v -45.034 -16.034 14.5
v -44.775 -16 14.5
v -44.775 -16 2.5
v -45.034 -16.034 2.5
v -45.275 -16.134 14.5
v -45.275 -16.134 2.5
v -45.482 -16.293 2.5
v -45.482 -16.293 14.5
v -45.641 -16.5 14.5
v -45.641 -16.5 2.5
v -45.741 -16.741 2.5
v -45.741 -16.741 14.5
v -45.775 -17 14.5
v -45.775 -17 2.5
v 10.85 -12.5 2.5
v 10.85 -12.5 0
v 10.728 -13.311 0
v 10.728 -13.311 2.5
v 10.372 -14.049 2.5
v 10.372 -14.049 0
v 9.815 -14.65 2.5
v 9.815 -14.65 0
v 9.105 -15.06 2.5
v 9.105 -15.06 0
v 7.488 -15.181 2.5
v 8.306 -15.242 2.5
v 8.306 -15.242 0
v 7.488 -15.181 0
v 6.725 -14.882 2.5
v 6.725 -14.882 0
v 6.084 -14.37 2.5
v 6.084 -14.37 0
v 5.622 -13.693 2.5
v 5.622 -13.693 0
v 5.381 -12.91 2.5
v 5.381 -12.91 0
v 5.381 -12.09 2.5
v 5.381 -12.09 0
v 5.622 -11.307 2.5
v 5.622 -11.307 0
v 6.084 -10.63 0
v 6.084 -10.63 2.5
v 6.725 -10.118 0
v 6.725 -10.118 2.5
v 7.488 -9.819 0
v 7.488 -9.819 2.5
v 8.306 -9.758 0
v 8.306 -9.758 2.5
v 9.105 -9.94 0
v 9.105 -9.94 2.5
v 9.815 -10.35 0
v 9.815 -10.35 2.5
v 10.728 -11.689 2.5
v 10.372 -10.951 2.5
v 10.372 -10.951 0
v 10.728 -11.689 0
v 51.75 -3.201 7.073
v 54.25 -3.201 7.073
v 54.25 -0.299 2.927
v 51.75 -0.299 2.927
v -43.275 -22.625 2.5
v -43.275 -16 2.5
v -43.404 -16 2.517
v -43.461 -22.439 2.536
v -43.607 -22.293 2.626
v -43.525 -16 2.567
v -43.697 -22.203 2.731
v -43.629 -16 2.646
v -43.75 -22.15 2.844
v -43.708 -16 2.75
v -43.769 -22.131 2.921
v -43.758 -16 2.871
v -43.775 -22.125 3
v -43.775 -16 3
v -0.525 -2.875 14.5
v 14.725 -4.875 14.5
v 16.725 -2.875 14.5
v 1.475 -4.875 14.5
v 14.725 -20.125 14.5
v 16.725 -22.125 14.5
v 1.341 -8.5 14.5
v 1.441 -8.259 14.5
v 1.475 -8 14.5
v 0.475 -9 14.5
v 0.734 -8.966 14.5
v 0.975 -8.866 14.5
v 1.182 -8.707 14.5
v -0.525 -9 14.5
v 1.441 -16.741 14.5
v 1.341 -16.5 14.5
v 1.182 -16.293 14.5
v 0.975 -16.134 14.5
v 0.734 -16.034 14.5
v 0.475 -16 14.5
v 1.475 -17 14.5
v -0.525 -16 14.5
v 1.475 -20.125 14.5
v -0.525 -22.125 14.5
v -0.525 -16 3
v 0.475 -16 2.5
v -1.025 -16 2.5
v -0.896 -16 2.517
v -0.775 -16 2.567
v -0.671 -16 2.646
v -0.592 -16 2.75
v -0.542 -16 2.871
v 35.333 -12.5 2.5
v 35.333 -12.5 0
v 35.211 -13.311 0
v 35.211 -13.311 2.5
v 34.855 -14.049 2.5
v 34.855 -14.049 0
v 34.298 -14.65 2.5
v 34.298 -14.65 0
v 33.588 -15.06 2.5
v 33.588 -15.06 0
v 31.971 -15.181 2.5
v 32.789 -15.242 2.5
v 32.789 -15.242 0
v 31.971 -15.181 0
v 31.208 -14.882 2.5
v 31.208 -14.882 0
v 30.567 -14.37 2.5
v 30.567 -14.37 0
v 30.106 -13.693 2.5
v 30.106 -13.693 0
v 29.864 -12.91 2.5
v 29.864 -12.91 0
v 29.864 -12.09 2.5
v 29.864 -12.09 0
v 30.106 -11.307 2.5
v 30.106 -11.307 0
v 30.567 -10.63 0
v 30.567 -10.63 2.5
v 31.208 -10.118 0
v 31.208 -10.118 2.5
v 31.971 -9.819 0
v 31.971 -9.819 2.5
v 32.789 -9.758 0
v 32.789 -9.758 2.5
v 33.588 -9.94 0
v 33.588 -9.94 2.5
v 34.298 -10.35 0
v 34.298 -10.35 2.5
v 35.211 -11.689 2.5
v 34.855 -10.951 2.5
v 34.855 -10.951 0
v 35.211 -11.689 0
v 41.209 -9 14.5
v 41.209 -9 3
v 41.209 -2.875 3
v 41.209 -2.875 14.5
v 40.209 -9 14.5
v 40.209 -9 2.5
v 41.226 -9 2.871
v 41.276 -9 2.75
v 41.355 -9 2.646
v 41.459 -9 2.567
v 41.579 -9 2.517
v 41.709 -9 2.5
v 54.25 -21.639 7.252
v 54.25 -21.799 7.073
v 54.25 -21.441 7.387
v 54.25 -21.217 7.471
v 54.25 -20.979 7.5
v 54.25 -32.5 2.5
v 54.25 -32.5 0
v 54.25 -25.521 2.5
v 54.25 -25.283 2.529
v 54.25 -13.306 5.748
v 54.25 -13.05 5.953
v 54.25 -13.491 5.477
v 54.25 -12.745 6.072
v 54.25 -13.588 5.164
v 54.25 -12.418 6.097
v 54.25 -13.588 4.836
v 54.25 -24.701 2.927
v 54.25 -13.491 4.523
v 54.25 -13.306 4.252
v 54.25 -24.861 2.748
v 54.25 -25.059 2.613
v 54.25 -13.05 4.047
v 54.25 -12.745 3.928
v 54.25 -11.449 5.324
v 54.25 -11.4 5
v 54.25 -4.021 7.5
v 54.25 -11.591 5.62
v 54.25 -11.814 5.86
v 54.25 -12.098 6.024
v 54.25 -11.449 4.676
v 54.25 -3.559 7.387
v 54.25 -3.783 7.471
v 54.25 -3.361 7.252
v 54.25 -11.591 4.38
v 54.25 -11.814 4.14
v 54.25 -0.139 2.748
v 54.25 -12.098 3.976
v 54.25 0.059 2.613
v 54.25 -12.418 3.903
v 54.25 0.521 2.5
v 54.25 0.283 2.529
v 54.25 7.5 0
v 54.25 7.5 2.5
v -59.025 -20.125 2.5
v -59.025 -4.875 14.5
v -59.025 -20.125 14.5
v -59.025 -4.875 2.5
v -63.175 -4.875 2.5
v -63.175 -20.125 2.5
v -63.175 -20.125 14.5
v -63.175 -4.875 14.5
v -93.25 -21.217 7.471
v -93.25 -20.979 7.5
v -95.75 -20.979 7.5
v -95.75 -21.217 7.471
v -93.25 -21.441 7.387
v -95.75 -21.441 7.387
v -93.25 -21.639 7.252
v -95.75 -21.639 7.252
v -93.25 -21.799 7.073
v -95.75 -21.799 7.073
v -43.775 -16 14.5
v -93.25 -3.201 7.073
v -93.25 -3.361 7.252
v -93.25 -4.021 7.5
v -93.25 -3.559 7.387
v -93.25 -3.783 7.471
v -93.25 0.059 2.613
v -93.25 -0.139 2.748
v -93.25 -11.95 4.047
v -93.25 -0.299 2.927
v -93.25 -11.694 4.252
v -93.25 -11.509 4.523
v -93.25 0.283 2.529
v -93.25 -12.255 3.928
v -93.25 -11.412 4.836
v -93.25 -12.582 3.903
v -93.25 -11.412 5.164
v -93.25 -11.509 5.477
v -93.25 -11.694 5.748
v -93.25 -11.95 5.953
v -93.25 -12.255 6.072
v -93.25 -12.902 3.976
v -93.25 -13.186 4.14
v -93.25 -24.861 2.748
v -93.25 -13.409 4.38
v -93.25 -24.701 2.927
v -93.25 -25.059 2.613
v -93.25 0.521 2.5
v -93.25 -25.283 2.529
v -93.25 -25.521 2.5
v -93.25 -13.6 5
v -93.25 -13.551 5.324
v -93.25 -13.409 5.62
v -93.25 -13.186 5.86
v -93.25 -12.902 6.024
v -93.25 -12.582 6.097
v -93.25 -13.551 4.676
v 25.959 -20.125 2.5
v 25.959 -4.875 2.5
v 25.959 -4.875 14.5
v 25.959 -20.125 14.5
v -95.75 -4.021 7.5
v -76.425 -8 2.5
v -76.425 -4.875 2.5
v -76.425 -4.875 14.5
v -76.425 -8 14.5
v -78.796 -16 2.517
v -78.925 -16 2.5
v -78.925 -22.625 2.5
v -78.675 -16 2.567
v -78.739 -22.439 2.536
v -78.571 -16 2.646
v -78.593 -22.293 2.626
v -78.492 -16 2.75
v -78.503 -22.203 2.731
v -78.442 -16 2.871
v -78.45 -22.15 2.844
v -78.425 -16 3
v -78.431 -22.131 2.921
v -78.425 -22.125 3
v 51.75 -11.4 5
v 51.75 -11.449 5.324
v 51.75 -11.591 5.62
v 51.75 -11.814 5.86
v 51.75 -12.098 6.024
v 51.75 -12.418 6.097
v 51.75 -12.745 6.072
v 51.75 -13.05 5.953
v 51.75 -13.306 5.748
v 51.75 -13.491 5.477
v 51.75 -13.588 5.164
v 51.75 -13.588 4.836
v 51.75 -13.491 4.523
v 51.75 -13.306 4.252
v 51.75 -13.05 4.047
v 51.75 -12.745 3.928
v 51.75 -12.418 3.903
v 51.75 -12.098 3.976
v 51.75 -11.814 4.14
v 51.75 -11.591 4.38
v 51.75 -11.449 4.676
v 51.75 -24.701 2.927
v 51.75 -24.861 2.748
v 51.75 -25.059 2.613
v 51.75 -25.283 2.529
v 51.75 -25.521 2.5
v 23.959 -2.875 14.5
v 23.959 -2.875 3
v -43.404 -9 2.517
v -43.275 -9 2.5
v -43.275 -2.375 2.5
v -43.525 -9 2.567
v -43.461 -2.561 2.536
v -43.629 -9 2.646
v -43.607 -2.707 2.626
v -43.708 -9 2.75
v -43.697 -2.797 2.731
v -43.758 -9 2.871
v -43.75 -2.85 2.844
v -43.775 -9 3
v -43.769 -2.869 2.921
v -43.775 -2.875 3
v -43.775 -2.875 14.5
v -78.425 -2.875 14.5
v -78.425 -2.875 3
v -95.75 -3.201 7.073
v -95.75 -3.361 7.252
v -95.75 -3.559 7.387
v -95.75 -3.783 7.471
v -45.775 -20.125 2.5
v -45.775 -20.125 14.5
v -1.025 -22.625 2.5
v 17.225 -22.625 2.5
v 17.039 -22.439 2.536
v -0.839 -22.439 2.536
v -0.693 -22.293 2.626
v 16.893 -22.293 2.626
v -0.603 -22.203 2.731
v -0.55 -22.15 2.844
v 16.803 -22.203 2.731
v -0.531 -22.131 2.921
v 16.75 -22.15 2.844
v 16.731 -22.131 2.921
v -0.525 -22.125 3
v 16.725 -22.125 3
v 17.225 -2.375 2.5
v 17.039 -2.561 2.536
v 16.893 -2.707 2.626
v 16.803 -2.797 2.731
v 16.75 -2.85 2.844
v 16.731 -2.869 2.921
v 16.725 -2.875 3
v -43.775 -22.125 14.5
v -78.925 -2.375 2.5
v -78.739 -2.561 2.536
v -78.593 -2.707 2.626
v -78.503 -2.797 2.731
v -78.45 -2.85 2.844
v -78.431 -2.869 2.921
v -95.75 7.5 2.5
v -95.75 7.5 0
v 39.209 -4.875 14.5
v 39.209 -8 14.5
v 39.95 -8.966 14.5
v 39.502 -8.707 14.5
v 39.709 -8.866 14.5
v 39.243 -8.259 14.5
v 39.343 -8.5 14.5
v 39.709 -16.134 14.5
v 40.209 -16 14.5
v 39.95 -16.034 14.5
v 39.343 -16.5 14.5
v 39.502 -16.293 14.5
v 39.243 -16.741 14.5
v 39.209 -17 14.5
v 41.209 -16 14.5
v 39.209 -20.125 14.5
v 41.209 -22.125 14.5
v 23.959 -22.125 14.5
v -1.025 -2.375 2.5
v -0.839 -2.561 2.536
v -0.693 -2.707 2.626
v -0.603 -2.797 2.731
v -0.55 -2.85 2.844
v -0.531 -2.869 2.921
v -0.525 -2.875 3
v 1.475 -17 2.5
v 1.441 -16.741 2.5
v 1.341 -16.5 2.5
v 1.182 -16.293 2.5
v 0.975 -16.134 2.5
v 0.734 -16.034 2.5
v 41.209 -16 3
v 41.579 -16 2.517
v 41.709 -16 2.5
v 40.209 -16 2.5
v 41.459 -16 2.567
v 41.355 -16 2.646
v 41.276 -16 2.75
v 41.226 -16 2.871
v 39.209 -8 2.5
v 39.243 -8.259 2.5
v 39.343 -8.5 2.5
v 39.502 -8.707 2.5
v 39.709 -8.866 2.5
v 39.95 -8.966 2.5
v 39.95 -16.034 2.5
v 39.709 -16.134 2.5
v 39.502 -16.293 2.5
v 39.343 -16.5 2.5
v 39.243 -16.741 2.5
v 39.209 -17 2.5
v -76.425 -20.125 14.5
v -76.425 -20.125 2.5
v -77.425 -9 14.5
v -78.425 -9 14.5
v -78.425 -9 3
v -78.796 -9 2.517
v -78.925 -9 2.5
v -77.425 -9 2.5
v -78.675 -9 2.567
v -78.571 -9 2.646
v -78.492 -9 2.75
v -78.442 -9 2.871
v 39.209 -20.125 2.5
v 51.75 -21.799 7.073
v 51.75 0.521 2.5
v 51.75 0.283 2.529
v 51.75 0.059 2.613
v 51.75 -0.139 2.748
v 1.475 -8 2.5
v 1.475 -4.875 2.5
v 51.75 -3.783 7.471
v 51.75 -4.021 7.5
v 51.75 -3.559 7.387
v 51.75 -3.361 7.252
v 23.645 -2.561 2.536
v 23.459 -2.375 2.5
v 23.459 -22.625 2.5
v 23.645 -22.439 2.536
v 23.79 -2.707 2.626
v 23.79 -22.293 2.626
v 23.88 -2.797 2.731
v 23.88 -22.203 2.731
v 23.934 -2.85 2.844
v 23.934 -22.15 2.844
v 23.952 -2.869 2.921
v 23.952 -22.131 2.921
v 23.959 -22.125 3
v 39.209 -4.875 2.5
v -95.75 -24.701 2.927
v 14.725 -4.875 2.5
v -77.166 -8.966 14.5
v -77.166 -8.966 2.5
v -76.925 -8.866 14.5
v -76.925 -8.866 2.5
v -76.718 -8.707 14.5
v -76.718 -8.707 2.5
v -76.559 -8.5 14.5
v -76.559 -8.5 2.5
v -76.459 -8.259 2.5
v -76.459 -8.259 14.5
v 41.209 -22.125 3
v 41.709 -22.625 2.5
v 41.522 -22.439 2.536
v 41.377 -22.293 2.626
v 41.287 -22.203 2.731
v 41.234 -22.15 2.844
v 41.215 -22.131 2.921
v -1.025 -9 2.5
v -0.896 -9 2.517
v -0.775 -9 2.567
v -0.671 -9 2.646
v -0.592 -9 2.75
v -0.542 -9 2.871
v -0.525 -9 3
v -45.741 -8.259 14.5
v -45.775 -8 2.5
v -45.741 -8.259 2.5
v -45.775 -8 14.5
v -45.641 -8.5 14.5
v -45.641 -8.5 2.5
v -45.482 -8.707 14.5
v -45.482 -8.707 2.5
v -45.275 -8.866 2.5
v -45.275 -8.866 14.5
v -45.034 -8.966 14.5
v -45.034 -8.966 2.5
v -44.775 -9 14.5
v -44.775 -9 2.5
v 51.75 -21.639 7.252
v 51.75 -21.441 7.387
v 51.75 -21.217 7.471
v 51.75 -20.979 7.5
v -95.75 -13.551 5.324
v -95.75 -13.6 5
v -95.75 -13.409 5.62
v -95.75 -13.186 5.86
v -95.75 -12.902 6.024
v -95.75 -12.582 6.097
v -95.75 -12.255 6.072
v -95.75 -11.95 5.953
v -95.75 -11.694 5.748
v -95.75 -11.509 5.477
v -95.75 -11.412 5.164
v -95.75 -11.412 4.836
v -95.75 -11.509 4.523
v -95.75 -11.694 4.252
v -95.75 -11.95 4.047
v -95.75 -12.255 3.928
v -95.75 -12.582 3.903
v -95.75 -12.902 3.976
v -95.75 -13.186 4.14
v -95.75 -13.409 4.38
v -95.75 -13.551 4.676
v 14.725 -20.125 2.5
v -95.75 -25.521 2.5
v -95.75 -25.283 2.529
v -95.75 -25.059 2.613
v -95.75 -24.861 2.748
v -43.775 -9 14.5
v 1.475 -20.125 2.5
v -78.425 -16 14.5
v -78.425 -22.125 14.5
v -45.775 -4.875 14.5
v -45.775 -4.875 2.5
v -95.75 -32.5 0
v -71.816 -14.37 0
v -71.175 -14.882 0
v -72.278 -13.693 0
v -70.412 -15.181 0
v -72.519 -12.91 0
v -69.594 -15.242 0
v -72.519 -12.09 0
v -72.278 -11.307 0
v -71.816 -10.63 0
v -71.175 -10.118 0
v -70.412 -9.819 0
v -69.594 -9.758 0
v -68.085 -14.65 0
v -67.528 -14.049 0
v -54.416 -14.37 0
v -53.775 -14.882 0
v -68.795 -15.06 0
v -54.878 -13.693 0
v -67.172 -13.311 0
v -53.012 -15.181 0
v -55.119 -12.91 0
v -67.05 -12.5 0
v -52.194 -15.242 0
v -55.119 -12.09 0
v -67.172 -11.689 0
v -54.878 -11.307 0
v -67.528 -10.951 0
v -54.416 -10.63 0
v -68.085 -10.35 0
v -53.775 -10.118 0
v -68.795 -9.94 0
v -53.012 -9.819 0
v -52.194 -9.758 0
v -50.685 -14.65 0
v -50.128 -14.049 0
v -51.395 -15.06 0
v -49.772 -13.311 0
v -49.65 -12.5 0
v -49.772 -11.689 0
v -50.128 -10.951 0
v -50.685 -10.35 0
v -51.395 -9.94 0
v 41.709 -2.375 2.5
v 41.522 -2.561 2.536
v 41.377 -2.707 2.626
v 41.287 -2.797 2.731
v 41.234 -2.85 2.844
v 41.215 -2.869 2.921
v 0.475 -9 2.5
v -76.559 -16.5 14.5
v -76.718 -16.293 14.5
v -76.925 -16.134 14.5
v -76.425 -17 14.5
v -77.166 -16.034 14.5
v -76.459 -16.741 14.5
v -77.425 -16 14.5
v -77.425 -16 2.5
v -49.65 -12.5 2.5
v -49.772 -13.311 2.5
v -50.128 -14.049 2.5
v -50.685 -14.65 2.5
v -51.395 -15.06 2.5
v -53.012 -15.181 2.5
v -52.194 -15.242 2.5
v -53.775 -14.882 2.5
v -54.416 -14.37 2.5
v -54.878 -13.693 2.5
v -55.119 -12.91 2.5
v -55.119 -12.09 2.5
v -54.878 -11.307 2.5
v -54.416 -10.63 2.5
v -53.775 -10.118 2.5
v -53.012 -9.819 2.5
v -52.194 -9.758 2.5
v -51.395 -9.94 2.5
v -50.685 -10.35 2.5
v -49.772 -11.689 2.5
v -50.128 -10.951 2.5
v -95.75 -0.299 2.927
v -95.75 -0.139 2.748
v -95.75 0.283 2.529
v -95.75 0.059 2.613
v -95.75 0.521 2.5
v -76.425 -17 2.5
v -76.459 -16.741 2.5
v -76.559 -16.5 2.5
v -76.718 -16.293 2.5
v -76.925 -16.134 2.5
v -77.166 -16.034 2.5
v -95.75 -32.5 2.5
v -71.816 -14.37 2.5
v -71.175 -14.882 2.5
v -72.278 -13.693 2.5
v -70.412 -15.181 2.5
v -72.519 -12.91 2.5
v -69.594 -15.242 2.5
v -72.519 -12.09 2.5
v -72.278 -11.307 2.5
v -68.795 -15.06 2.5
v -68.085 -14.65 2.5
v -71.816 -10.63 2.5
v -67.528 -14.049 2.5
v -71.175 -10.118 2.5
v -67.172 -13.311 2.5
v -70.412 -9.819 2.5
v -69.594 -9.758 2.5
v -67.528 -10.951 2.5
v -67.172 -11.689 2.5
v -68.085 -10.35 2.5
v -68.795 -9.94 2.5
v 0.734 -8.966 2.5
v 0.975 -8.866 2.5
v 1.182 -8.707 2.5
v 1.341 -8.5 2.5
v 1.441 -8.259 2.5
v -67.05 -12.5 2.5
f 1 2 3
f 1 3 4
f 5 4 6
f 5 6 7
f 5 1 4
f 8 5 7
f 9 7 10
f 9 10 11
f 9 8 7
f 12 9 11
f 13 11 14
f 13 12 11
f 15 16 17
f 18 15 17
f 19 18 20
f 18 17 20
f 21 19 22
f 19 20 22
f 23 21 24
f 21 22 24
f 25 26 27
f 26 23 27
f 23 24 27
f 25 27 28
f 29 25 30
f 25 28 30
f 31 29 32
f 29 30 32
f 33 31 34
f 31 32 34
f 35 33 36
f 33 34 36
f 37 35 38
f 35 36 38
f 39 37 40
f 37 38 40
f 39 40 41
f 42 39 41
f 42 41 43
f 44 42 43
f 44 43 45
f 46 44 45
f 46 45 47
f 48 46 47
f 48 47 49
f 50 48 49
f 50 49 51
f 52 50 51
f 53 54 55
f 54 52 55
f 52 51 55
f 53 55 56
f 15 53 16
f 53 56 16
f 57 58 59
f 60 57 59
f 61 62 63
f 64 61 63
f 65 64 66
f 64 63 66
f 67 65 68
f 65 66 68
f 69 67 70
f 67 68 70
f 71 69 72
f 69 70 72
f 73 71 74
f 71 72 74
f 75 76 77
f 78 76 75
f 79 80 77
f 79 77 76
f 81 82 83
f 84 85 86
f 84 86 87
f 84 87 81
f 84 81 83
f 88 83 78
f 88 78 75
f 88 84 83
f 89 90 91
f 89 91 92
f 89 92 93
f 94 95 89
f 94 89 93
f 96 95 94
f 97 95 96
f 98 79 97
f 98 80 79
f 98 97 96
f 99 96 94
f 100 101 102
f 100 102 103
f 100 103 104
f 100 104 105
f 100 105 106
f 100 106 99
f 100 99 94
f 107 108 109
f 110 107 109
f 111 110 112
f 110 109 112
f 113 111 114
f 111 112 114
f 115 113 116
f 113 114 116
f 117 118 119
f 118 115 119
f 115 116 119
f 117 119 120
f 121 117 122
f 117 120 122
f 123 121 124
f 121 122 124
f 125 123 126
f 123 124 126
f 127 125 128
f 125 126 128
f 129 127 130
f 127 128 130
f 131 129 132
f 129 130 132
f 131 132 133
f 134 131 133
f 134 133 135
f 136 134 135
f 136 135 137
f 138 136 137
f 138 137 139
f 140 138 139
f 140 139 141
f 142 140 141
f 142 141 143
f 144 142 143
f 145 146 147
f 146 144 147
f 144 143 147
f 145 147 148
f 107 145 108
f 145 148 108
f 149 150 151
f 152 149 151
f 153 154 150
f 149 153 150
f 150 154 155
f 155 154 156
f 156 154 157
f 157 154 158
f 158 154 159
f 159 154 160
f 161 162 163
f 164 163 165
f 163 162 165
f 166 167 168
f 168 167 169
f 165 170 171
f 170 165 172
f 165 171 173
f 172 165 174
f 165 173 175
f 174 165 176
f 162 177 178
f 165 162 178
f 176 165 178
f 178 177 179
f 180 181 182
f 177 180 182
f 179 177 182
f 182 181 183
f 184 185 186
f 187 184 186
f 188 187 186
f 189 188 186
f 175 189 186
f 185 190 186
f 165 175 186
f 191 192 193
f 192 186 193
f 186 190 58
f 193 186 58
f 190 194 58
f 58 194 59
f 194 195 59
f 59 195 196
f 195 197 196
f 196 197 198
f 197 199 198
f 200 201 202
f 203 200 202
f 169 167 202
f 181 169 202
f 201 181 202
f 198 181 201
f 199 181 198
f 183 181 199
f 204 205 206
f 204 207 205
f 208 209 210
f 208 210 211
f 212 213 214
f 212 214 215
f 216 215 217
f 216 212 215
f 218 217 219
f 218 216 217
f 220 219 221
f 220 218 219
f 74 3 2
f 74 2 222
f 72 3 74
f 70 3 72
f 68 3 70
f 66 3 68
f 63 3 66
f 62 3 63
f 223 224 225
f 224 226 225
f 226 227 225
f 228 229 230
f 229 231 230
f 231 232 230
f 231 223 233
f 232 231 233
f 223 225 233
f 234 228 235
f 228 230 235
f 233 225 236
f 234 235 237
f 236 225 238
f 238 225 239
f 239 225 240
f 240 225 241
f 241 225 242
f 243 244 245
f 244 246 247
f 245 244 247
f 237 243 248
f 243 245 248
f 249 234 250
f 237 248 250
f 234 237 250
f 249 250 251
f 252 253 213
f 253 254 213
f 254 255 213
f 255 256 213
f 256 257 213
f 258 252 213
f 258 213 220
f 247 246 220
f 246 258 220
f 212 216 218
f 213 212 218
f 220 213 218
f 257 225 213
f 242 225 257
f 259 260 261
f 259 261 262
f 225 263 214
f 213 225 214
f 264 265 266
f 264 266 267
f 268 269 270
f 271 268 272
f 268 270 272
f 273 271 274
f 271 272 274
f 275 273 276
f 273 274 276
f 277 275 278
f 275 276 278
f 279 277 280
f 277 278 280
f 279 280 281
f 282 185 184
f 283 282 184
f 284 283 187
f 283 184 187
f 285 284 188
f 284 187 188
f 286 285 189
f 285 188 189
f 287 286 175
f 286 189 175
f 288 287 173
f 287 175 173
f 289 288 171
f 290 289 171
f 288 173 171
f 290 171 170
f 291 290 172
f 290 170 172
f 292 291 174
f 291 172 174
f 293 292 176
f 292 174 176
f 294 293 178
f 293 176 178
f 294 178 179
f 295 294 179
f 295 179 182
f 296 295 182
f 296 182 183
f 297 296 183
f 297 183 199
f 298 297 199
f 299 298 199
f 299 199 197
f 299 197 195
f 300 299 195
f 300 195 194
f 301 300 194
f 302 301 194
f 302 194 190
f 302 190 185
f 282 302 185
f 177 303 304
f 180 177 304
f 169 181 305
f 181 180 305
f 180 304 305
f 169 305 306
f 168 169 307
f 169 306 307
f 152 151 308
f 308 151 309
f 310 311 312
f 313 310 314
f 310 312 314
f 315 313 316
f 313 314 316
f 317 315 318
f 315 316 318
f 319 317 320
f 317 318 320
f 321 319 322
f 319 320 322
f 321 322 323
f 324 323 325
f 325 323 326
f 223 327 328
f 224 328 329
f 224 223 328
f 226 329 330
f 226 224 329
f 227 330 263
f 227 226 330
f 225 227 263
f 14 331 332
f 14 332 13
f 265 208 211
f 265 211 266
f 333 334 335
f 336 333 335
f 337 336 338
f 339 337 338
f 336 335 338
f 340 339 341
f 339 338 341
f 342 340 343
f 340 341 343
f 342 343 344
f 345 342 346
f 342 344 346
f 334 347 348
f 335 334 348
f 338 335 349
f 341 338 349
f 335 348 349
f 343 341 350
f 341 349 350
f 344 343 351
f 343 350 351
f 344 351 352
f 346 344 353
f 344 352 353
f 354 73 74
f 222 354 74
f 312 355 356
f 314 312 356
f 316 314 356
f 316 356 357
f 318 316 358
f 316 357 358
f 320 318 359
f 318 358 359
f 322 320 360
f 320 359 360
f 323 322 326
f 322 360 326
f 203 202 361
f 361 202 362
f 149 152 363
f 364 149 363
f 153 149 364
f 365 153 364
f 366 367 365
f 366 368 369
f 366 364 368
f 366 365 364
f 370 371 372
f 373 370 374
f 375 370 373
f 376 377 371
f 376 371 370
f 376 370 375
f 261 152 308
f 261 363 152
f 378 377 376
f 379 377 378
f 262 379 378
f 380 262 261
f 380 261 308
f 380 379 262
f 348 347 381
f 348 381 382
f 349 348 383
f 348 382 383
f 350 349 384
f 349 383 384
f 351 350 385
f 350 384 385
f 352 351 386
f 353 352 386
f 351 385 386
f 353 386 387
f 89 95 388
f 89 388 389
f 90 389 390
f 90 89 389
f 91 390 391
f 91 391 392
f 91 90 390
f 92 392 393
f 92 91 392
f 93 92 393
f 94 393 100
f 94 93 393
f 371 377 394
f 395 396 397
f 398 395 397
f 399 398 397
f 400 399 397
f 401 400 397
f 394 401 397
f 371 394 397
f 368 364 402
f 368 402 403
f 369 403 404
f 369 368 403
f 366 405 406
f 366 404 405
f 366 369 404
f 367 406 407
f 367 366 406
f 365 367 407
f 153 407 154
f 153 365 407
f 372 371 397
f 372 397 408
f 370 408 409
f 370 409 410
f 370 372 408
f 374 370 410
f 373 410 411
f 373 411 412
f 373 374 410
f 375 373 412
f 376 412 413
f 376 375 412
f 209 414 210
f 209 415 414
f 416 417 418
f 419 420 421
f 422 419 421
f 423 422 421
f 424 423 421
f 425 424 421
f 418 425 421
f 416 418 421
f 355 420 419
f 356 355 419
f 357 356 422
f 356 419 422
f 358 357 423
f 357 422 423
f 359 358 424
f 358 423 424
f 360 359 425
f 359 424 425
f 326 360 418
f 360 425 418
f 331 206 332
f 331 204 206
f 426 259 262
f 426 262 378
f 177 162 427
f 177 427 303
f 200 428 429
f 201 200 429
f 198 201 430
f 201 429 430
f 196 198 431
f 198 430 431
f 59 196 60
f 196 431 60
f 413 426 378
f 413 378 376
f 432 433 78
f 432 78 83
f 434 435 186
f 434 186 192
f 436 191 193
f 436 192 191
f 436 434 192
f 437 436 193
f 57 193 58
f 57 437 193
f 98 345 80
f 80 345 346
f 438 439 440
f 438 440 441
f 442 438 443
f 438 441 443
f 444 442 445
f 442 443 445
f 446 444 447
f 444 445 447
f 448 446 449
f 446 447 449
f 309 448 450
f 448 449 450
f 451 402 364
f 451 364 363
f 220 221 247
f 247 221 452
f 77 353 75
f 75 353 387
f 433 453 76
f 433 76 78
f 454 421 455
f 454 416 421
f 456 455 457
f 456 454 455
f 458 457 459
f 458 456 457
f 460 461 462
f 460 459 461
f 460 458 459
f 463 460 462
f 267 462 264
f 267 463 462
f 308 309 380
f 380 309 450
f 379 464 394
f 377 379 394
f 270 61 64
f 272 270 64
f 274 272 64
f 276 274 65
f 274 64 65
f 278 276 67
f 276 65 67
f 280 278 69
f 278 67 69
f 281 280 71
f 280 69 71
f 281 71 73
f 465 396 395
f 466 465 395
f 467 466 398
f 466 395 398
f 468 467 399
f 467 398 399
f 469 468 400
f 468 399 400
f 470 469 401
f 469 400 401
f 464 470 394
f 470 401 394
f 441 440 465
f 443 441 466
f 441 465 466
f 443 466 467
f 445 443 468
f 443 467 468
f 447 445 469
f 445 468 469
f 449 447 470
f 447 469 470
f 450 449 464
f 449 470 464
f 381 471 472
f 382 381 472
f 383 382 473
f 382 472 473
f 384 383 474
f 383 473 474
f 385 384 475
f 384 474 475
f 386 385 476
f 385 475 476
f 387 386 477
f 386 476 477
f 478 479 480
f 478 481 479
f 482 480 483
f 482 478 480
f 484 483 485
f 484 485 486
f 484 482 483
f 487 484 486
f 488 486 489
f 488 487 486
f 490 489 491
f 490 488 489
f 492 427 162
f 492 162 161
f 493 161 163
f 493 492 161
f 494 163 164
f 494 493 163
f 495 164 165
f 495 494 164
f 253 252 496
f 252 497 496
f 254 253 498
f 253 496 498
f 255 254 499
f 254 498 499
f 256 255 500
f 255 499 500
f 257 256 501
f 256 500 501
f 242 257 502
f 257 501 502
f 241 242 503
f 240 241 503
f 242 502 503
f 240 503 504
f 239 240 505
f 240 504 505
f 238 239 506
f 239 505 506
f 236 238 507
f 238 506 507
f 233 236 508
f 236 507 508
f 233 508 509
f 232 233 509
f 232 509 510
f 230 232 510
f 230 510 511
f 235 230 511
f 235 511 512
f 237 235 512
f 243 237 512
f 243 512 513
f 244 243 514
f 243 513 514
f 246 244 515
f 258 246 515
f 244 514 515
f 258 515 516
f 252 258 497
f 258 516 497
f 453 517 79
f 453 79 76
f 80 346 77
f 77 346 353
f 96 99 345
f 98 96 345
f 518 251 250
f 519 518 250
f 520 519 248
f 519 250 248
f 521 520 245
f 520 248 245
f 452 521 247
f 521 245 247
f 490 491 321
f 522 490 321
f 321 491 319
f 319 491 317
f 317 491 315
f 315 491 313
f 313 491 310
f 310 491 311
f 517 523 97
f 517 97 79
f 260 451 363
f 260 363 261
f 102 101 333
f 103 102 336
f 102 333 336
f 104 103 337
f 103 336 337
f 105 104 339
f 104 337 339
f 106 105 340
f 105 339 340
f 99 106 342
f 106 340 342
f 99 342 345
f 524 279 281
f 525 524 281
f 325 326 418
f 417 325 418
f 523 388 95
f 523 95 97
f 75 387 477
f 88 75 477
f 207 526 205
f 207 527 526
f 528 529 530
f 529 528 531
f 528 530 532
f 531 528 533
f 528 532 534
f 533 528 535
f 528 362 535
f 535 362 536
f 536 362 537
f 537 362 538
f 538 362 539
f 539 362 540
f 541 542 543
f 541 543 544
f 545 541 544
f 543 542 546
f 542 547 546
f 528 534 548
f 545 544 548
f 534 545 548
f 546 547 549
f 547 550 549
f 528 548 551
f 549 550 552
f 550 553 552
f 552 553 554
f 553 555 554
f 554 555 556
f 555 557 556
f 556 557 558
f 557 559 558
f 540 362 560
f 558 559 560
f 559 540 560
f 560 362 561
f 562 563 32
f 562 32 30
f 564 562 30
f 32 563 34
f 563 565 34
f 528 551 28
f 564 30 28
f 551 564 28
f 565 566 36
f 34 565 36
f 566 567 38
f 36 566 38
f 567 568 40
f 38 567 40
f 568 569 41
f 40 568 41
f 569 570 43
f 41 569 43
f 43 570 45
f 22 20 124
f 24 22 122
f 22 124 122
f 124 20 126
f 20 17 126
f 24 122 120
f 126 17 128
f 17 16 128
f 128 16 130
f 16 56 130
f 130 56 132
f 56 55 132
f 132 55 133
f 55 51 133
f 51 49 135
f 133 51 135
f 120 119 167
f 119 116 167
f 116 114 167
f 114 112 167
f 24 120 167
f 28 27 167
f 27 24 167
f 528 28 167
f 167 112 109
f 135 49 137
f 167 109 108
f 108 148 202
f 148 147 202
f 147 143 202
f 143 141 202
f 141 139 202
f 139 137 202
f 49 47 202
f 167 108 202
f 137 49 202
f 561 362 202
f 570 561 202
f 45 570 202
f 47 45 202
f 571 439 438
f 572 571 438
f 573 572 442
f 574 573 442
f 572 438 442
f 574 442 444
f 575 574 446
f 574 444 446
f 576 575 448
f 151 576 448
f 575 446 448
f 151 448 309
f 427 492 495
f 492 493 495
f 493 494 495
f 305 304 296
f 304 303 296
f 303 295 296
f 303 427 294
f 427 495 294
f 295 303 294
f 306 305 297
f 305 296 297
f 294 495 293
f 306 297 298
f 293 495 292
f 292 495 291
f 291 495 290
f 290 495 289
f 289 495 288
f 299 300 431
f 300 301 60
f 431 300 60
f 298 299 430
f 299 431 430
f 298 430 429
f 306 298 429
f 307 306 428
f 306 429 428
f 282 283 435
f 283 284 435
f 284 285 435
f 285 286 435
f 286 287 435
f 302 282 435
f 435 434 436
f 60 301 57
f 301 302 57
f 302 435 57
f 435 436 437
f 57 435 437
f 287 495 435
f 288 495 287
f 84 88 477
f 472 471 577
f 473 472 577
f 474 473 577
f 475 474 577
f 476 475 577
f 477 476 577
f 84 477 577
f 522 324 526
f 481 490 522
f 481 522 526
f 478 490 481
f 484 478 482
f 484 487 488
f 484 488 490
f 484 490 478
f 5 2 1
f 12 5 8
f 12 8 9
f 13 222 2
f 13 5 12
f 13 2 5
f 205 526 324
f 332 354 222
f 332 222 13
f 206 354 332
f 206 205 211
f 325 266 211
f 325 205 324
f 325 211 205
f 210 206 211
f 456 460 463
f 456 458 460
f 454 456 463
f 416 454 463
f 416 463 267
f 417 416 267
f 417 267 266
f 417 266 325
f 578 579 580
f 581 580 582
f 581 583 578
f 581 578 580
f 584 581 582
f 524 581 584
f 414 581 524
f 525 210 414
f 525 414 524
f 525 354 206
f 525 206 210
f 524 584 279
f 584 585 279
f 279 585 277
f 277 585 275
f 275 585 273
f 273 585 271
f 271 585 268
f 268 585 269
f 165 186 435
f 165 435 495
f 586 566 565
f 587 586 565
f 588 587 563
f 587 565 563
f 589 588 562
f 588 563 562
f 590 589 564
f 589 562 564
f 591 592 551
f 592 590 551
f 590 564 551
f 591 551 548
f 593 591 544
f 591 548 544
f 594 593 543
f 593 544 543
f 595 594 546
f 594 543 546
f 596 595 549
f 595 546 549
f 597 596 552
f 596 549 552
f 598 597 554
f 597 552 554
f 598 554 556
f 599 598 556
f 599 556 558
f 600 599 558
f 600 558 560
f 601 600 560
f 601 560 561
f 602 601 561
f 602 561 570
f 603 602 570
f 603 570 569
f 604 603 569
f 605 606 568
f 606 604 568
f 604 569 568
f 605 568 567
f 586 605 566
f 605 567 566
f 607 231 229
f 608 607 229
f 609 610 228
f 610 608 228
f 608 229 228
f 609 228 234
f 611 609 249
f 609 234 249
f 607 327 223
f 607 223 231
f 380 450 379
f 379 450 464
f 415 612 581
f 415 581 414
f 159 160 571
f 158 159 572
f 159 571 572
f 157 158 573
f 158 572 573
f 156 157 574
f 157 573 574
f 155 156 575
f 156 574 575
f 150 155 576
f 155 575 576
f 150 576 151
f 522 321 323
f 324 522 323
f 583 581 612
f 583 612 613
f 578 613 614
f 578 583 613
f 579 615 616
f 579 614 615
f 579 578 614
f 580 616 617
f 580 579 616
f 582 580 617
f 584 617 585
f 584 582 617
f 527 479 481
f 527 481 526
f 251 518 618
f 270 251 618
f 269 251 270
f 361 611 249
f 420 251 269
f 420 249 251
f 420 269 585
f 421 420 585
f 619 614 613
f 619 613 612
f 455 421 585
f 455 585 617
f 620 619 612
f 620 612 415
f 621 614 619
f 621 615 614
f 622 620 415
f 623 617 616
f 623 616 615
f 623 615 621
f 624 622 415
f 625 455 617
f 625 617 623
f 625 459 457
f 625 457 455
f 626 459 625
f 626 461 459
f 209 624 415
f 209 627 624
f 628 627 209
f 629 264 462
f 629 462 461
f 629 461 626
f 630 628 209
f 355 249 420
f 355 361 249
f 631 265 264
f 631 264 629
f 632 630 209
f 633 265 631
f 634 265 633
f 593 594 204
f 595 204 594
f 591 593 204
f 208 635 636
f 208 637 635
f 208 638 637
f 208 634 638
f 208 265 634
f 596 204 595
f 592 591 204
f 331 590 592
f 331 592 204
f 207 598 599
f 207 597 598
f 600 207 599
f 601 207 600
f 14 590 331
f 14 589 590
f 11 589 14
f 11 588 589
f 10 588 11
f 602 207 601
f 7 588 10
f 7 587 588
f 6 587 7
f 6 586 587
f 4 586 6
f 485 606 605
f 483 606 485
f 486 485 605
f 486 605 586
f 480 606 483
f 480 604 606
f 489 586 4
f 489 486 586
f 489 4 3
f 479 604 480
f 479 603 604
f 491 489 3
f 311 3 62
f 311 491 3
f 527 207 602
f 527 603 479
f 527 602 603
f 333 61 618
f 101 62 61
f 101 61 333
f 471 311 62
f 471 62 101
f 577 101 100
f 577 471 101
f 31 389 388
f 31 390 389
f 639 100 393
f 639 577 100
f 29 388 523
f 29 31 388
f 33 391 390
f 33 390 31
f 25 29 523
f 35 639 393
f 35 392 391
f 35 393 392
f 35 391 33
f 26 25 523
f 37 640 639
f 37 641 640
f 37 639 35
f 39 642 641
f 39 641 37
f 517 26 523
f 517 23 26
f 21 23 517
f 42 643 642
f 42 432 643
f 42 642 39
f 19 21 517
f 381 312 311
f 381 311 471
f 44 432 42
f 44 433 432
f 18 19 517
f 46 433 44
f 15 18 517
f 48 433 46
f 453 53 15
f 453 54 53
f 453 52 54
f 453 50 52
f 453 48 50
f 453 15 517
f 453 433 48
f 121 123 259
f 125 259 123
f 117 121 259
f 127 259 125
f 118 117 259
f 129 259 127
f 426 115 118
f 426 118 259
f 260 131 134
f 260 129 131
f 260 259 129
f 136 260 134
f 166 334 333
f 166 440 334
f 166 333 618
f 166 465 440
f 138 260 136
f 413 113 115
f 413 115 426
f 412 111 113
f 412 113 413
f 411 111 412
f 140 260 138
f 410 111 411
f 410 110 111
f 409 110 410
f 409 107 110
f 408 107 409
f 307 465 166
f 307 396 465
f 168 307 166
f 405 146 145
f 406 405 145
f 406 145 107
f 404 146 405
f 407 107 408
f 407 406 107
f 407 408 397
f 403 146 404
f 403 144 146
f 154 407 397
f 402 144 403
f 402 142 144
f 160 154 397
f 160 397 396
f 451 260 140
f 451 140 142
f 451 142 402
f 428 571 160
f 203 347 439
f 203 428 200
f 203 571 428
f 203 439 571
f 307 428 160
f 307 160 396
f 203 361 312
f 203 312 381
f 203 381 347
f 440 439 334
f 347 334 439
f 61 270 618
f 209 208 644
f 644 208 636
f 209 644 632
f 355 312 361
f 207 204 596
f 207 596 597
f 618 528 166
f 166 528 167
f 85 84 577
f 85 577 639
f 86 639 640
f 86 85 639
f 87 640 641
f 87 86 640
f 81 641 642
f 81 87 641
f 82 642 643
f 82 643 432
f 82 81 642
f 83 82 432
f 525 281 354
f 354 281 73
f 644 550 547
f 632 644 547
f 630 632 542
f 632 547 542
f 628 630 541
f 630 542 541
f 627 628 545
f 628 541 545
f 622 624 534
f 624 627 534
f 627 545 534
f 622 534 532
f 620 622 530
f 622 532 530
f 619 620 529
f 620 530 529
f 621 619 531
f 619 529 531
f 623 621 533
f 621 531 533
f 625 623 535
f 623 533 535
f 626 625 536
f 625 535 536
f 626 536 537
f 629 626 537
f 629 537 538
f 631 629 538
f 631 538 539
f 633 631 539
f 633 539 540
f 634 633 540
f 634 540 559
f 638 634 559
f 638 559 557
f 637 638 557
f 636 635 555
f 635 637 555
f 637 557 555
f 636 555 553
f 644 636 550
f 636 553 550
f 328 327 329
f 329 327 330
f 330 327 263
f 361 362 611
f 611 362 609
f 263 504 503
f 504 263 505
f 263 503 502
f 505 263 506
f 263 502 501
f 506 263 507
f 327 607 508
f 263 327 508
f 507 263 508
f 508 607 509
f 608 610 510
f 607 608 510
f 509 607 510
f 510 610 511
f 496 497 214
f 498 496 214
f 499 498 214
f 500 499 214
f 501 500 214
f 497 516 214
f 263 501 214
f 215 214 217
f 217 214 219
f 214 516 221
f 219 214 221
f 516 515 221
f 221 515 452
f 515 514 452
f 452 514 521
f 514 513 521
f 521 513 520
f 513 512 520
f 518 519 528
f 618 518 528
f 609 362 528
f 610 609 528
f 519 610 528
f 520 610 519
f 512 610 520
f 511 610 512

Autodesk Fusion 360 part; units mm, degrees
sketch "Sketch1" plane through (0, 0, 0) normal (0, 0, 1) x (1, 0, 0)
  line L0 (68.541, -12.5) -> (-110, -12.5) construction
  line L1 (-20.75, -50) -> (-20.75, 25) construction
  point P0 (-20.75, -12.5)
sketch "Sketch2" plane through (0, 0, 0) normal (0, 0, 1) x (1, 0, 0)
  line L0 (54.25, 7.5) -> (-95.75, 7.5)
  line L1 (-95.75, 7.5) -> (-95.75, -32.5)
  line L2 (-95.75, -32.5) -> (54.25, -32.5)
  line L3 (54.25, -32.5) -> (54.25, 7.5)
  line L4 (54.25, 7.5) -> (-95.75, -32.5) construction
  line L5 (-95.75, 7.5) -> (54.25, -32.5) construction
  line L6 (26.6666, -12.5) -> (38.5, -12.5) construction
  circle A0 centre (32.5833, -12.5) radius 2.75
  line L7 (14, -12.5) -> (2.2, -12.5) construction
  circle A1 centre (8.1, -12.5) radius 2.75
  line L8 (-49.1, -12.5) -> (-52.4, -12.5) construction
  circle A2 centre (-52.4, -12.5) radius 2.75
  line L9 (-73.1, -12.5) -> (-69.8, -12.5) construction
  circle A3 centre (-69.8, -12.5) radius 2.75
  point P0 (-20.75, -12.5)
  dimension "d1" = 150
  dimension "d2" = 40
  dimension "d3" = 5.5
  dimension "d4" = 5.5
  dimension "d5" = 3.3
  dimension "d6" = 5.5
  dimension "d7" = 3.3
  dimension "d8" = 5.5
extrude "Extrude1" add sketch "Sketch2" along normal blind 2.5
sketch "Sketch3" plane through (0, 0, 2.5) normal (0, 0, 1) x (-1, 0, 0)
  circle A0 centre (-32.5833, 12.5) radius 2.75
  circle A1 centre (69.8, 12.5) radius 2.75
  circle A2 centre (-8.1, 12.5) radius 2.75
  circle A3 centre (52.4, 12.5) radius 2.75
  line L0 (-54.25, 32.5) -> (-54.25, -7.5)
  line L1 (-54.25, -7.5) -> (95.75, -7.5)
  line L2 (95.75, -7.5) -> (95.75, 32.5)
  line L3 (95.75, 32.5) -> (-54.25, 32.5)
sketch "Sketch4" plane through (0, 0, 2.5) normal (0, 0, 1) x (-1, 0, 0)
  line L0 (-29.8338, 12.5) -> (-35.3337, 12.5) construction
  line L1 (-39.2087, 4.875) -> (-25.9587, 4.875)
  line L2 (-25.9587, 4.875) -> (-25.9587, 20.125)
  line L3 (-25.9587, 20.125) -> (-39.2087, 20.125)
  line L4 (-39.2087, 20.125) -> (-39.2087, 4.875)
  line L5 (-39.2087, 4.875) -> (-25.9587, 20.125) construction
  line L6 (-25.9587, 4.875) -> (-39.2087, 20.125) construction
  line L7 (-41.2087, 2.875) -> (-23.9587, 2.875)
  line L8 (-23.9587, 2.875) -> (-23.9587, 22.125)
  line L9 (-23.9587, 22.125) -> (-41.2087, 22.125)
  line L10 (-41.2087, 22.125) -> (-41.2087, 2.875)
  line L11 (-41.2087, 2.875) -> (-23.9587, 22.125) construction
  line L12 (-23.9587, 2.875) -> (-41.2087, 22.125) construction
  line L13 (-39.2087, 12.5) -> (-39.2087, 9)
  line L14 (-39.2087, 9) -> (-41.2087, 9)
  line L15 (-41.2087, 9) -> (-41.2087, 16)
  line L16 (-41.2087, 16) -> (-39.2087, 16)
  line L17 (-39.2087, 16) -> (-39.2087, 12.5)
  line L18 (-5.35, 12.5) -> (-10.85, 12.5) construction
  line L19 (-14.725, 4.875) -> (-1.475, 4.875)
  line L20 (-1.475, 4.875) -> (-1.475, 20.125)
  line L21 (-1.475, 20.125) -> (-14.725, 20.125)
  line L22 (-14.725, 20.125) -> (-14.725, 4.875)
  line L23 (-14.725, 4.875) -> (-1.475, 20.125) construction
  line L24 (-1.475, 4.875) -> (-14.725, 20.125) construction
  line L25 (-16.725, 2.875) -> (0.525, 2.875)
  line L26 (0.525, 2.875) -> (0.525, 22.125)
  line L27 (0.525, 22.125) -> (-16.725, 22.125)
  line L28 (-16.725, 22.125) -> (-16.725, 2.875)
  line L29 (-16.725, 2.875) -> (0.525, 22.125) construction
  line L30 (0.525, 2.875) -> (-16.725, 22.125) construction
  line L31 (-1.475, 16) -> (-1.475, 9)
  line L32 (0.525, 16) -> (0.525, 9)
  line L33 (0.525, 9) -> (-1.475, 9)
  line L34 (0.525, 16) -> (-1.475, 16)
  line L35 (55.15, 12.5) -> (49.65, 12.5) construction
  line L36 (45.775, 4.875) -> (59.025, 4.875)
  line L37 (59.025, 4.875) -> (59.025, 20.125)
  line L38 (59.025, 20.125) -> (45.775, 20.125)
  line L39 (45.775, 20.125) -> (45.775, 4.875)
  line L40 (45.775, 4.875) -> (59.025, 20.125) construction
  line L41 (59.025, 4.875) -> (45.775, 20.125) construction
  line L42 (61.025, 22.125) -> (43.775, 22.125)
  line L43 (43.775, 22.125) -> (43.775, 2.875)
  line L44 (43.775, 2.875) -> (61.025, 2.875)
  line L45 (61.025, 22.125) -> (43.775, 2.875) construction
  line L46 (43.775, 22.125) -> (61.025, 2.875) construction
  line L47 (72.55, 12.5) -> (67.05, 12.5) construction
  line L48 (63.175, 4.875) -> (76.425, 4.875)
  line L49 (76.425, 4.875) -> (76.425, 20.125)
  line L50 (76.425, 20.125) -> (63.175, 20.125)
  line L51 (63.175, 20.125) -> (63.175, 4.875)
  line L52 (63.175, 4.875) -> (76.425, 20.125) construction
  line L53 (76.425, 4.875) -> (63.175, 20.125) construction
  line L54 (61.175, 2.875) -> (78.425, 2.875)
  line L55 (78.425, 2.875) -> (78.425, 22.125)
  line L56 (78.425, 22.125) -> (61.175, 22.125)
  line L57 (61.175, 2.875) -> (78.425, 22.125) construction
  line L58 (78.425, 2.875) -> (61.175, 22.125) construction
  line L59 (61.175, 2.875) -> (61.025, 2.875)
  line L60 (61.175, 22.125) -> (61.025, 22.125)
  line L61 (43.775, 16) -> (43.775, 9)
  line L62 (45.775, 16) -> (45.775, 9)
  line L63 (45.775, 9) -> (43.775, 9)
  line L64 (45.775, 16) -> (43.775, 16)
  line L65 (76.425, 16) -> (76.425, 9)
  line L66 (78.425, 16) -> (78.425, 9)
  line L67 (78.425, 9) -> (76.425, 9)
  line L68 (76.425, 16) -> (78.425, 16)
  point P0 (-32.5837, 12.5)
  point P1 (-32.5837, 12.5)
  point P2 (-8.1, 12.5)
  point P3 (-8.1, 12.5)
  point P4 (-1.475, 12.5)
  point P5 (0.525, 12.5)
  point P6 (52.4, 12.5)
  point P7 (52.4, 12.5)
  point P8 (69.8, 12.5)
  point P9 (69.8, 12.5)
  point P10 (43.775, 12.5)
  point P11 (45.775, 12.5)
  point P12 (76.425, 12.5)
  point P13 (78.425, 12.5)
  dimension "d11" = 13.25
  dimension "d12" = 15.25
  dimension "d13" = 17.25
  dimension "d14" = 19.25
  dimension "d15" = 3.5
  dimension "d16" = 7
  dimension "d17" = 13.25
  dimension "d18" = 15.25
  dimension "d19" = 17.25
  dimension "d20" = 19.25
  dimension "d21" = 7
  dimension "d22" = 7
  dimension "d23" = 13.25
  dimension "d24" = 15.25
  dimension "d25" = 17.25
  dimension "d26" = 19.25
  dimension "d27" = 13.25
  dimension "d28" = 15.25
  dimension "d29" = 17.25
  dimension "d30" = 19.25
  dimension "d31" = 7
  dimension "d32" = 7
  dimension "d33" = 7
  dimension "d34" = 7
extrude "Extrude2" add sketch "Sketch4" along normal blind 12 contours L1 L2 L3 L4 L7 L8 L9 L10 L14 L16 | L19 L20 L21 L22 L25 L26 L27 L28 L33 L34 | L36 L37 L38 L39 L42 L43 L44 L48 L49 L50 L51 L54 L55 L56 L59 L60 L63 L64 L67 L68
sketch "Sketch5" plane through (0, 0, 2.5) normal (0, 0, 1) x (-1, 0, 0)
sketch "Sketch7" plane through (54.25, 0, 0) normal (1, 0, 0) x (0, 1, 0)
  line L0 (-32.5, 0) -> (7.5, 0)
  line L1 (7.5, 0) -> (7.5, 2.5)
  line L2 (7.5, 2.5) -> (-32.5, 2.5)
  line L3 (-32.5, 2.5) -> (-32.5, 0)
  line L4 (-25, 2.5) -> (0, 2.5)
  line L5 (-21.5, 2.5) -> (-3.5, 2.5)
  line L6 (-12.5, 7.5) -> (-3.5, 7.5)
  line L7 (-3.5, 7.5) -> (0, 2.5)
  line L8 (-12.5, 7.5) -> (-21.5, 7.5)
  line L9 (-21.5, 7.5) -> (-25, 2.5)
  line L10 (-12.5, 2.5) -> (-12.5, 7.5) construction
  circle A0 centre (-12.5, 5) radius 1.1
  point P0 (-12.5, 2.5)
  point P1 (-12.5, 2.5)
  dimension "d39" = 25
  dimension "d40" = 18
  dimension "d41" = 2.2
extrude "Extrude3" add sketch "Sketch7" against normal blind 2.5 contours L2 L4 L5 L6 L7 L8 L9
sketch "Sketch8" plane through (-95.75, 0, 0) normal (-1, 0, 0) x (0, -1, 0)
  line L0 (-7.5, 0) -> (32.5, 0)
  line L1 (32.5, 0) -> (32.5, 2.5)
  line L2 (32.5, 2.5) -> (-7.5, 2.5)
  line L3 (-7.5, 2.5) -> (-7.5, 0)
  line L4 (0, 2.5) -> (25, 2.5)
  line L5 (3.5, 7.5) -> (21.5, 7.5)
  line L6 (3.5, 7.5) -> (0, 2.5)
  line L7 (21.5, 7.5) -> (25, 2.5)
  circle A0 centre (12.5, 5) radius 1.1
  point P0 (12.5, 2.5)
  dimension "d44" = 25
  dimension "d46" = 18
  dimension "d47" = 2.2
extrude "Extrude4" add sketch "Sketch8" against normal blind 2.5 contours L2 L4 L5 L6 L7
fillet "Fillet1" radius 1 4 edges at (-94.5, -21.5, 7.5) (-94.5, -25, 2.5) (-94.5, -3.5, 7.5) (-94.5, 0, 2.5)
fillet "Fillet2" radius 1 4 edges at (53, -25, 2.5) (53, -21.5, 7.5) (53, -3.5, 7.5) (53, 0, 2.5)
fillet "Fillet3" radius 0.5 5 edges at (41.2087, -19.0625, 2.5) (32.5837, -22.125, 2.5) (41.2087, -5.9375, 2.5) (32.5837, -2.875, 2.5) (23.9587, -12.5, 2.5)
fillet "Fillet4" radius 0.5 15 edges at (16.725, -12.5, 2.5) (8.1, -2.875, 2.5) (8.1, -22.125, 2.5) (-0.525, -5.9375, 2.5) (-0.525, -19.0625, 2.5) (-52.4, -22.125, 2.5) (-61.1, -22.125, 2.5) (-69.8, -22.125, 2.5) (-78.425, -19.0625, 2.5) (-78.425, -5.9375, 2.5) (-43.775, -19.0625, 2.5) (-43.775, -5.9375, 2.5) (-69.8, -2.875, 2.5) (-61.1, -2.875, 2.5) (-52.4, -2.875, 2.5)
fillet "Fillet5" radius 1 8 edges at (-45.775, -16, 8.5) (-45.775, -9, 8.5) (-76.425, -9, 8.5) (-76.425, -16, 8.5) (1.475, -16, 8.5) (1.475, -9, 8.5) (39.2087, -16, 8.5) (39.2087, -9, 8.5)
